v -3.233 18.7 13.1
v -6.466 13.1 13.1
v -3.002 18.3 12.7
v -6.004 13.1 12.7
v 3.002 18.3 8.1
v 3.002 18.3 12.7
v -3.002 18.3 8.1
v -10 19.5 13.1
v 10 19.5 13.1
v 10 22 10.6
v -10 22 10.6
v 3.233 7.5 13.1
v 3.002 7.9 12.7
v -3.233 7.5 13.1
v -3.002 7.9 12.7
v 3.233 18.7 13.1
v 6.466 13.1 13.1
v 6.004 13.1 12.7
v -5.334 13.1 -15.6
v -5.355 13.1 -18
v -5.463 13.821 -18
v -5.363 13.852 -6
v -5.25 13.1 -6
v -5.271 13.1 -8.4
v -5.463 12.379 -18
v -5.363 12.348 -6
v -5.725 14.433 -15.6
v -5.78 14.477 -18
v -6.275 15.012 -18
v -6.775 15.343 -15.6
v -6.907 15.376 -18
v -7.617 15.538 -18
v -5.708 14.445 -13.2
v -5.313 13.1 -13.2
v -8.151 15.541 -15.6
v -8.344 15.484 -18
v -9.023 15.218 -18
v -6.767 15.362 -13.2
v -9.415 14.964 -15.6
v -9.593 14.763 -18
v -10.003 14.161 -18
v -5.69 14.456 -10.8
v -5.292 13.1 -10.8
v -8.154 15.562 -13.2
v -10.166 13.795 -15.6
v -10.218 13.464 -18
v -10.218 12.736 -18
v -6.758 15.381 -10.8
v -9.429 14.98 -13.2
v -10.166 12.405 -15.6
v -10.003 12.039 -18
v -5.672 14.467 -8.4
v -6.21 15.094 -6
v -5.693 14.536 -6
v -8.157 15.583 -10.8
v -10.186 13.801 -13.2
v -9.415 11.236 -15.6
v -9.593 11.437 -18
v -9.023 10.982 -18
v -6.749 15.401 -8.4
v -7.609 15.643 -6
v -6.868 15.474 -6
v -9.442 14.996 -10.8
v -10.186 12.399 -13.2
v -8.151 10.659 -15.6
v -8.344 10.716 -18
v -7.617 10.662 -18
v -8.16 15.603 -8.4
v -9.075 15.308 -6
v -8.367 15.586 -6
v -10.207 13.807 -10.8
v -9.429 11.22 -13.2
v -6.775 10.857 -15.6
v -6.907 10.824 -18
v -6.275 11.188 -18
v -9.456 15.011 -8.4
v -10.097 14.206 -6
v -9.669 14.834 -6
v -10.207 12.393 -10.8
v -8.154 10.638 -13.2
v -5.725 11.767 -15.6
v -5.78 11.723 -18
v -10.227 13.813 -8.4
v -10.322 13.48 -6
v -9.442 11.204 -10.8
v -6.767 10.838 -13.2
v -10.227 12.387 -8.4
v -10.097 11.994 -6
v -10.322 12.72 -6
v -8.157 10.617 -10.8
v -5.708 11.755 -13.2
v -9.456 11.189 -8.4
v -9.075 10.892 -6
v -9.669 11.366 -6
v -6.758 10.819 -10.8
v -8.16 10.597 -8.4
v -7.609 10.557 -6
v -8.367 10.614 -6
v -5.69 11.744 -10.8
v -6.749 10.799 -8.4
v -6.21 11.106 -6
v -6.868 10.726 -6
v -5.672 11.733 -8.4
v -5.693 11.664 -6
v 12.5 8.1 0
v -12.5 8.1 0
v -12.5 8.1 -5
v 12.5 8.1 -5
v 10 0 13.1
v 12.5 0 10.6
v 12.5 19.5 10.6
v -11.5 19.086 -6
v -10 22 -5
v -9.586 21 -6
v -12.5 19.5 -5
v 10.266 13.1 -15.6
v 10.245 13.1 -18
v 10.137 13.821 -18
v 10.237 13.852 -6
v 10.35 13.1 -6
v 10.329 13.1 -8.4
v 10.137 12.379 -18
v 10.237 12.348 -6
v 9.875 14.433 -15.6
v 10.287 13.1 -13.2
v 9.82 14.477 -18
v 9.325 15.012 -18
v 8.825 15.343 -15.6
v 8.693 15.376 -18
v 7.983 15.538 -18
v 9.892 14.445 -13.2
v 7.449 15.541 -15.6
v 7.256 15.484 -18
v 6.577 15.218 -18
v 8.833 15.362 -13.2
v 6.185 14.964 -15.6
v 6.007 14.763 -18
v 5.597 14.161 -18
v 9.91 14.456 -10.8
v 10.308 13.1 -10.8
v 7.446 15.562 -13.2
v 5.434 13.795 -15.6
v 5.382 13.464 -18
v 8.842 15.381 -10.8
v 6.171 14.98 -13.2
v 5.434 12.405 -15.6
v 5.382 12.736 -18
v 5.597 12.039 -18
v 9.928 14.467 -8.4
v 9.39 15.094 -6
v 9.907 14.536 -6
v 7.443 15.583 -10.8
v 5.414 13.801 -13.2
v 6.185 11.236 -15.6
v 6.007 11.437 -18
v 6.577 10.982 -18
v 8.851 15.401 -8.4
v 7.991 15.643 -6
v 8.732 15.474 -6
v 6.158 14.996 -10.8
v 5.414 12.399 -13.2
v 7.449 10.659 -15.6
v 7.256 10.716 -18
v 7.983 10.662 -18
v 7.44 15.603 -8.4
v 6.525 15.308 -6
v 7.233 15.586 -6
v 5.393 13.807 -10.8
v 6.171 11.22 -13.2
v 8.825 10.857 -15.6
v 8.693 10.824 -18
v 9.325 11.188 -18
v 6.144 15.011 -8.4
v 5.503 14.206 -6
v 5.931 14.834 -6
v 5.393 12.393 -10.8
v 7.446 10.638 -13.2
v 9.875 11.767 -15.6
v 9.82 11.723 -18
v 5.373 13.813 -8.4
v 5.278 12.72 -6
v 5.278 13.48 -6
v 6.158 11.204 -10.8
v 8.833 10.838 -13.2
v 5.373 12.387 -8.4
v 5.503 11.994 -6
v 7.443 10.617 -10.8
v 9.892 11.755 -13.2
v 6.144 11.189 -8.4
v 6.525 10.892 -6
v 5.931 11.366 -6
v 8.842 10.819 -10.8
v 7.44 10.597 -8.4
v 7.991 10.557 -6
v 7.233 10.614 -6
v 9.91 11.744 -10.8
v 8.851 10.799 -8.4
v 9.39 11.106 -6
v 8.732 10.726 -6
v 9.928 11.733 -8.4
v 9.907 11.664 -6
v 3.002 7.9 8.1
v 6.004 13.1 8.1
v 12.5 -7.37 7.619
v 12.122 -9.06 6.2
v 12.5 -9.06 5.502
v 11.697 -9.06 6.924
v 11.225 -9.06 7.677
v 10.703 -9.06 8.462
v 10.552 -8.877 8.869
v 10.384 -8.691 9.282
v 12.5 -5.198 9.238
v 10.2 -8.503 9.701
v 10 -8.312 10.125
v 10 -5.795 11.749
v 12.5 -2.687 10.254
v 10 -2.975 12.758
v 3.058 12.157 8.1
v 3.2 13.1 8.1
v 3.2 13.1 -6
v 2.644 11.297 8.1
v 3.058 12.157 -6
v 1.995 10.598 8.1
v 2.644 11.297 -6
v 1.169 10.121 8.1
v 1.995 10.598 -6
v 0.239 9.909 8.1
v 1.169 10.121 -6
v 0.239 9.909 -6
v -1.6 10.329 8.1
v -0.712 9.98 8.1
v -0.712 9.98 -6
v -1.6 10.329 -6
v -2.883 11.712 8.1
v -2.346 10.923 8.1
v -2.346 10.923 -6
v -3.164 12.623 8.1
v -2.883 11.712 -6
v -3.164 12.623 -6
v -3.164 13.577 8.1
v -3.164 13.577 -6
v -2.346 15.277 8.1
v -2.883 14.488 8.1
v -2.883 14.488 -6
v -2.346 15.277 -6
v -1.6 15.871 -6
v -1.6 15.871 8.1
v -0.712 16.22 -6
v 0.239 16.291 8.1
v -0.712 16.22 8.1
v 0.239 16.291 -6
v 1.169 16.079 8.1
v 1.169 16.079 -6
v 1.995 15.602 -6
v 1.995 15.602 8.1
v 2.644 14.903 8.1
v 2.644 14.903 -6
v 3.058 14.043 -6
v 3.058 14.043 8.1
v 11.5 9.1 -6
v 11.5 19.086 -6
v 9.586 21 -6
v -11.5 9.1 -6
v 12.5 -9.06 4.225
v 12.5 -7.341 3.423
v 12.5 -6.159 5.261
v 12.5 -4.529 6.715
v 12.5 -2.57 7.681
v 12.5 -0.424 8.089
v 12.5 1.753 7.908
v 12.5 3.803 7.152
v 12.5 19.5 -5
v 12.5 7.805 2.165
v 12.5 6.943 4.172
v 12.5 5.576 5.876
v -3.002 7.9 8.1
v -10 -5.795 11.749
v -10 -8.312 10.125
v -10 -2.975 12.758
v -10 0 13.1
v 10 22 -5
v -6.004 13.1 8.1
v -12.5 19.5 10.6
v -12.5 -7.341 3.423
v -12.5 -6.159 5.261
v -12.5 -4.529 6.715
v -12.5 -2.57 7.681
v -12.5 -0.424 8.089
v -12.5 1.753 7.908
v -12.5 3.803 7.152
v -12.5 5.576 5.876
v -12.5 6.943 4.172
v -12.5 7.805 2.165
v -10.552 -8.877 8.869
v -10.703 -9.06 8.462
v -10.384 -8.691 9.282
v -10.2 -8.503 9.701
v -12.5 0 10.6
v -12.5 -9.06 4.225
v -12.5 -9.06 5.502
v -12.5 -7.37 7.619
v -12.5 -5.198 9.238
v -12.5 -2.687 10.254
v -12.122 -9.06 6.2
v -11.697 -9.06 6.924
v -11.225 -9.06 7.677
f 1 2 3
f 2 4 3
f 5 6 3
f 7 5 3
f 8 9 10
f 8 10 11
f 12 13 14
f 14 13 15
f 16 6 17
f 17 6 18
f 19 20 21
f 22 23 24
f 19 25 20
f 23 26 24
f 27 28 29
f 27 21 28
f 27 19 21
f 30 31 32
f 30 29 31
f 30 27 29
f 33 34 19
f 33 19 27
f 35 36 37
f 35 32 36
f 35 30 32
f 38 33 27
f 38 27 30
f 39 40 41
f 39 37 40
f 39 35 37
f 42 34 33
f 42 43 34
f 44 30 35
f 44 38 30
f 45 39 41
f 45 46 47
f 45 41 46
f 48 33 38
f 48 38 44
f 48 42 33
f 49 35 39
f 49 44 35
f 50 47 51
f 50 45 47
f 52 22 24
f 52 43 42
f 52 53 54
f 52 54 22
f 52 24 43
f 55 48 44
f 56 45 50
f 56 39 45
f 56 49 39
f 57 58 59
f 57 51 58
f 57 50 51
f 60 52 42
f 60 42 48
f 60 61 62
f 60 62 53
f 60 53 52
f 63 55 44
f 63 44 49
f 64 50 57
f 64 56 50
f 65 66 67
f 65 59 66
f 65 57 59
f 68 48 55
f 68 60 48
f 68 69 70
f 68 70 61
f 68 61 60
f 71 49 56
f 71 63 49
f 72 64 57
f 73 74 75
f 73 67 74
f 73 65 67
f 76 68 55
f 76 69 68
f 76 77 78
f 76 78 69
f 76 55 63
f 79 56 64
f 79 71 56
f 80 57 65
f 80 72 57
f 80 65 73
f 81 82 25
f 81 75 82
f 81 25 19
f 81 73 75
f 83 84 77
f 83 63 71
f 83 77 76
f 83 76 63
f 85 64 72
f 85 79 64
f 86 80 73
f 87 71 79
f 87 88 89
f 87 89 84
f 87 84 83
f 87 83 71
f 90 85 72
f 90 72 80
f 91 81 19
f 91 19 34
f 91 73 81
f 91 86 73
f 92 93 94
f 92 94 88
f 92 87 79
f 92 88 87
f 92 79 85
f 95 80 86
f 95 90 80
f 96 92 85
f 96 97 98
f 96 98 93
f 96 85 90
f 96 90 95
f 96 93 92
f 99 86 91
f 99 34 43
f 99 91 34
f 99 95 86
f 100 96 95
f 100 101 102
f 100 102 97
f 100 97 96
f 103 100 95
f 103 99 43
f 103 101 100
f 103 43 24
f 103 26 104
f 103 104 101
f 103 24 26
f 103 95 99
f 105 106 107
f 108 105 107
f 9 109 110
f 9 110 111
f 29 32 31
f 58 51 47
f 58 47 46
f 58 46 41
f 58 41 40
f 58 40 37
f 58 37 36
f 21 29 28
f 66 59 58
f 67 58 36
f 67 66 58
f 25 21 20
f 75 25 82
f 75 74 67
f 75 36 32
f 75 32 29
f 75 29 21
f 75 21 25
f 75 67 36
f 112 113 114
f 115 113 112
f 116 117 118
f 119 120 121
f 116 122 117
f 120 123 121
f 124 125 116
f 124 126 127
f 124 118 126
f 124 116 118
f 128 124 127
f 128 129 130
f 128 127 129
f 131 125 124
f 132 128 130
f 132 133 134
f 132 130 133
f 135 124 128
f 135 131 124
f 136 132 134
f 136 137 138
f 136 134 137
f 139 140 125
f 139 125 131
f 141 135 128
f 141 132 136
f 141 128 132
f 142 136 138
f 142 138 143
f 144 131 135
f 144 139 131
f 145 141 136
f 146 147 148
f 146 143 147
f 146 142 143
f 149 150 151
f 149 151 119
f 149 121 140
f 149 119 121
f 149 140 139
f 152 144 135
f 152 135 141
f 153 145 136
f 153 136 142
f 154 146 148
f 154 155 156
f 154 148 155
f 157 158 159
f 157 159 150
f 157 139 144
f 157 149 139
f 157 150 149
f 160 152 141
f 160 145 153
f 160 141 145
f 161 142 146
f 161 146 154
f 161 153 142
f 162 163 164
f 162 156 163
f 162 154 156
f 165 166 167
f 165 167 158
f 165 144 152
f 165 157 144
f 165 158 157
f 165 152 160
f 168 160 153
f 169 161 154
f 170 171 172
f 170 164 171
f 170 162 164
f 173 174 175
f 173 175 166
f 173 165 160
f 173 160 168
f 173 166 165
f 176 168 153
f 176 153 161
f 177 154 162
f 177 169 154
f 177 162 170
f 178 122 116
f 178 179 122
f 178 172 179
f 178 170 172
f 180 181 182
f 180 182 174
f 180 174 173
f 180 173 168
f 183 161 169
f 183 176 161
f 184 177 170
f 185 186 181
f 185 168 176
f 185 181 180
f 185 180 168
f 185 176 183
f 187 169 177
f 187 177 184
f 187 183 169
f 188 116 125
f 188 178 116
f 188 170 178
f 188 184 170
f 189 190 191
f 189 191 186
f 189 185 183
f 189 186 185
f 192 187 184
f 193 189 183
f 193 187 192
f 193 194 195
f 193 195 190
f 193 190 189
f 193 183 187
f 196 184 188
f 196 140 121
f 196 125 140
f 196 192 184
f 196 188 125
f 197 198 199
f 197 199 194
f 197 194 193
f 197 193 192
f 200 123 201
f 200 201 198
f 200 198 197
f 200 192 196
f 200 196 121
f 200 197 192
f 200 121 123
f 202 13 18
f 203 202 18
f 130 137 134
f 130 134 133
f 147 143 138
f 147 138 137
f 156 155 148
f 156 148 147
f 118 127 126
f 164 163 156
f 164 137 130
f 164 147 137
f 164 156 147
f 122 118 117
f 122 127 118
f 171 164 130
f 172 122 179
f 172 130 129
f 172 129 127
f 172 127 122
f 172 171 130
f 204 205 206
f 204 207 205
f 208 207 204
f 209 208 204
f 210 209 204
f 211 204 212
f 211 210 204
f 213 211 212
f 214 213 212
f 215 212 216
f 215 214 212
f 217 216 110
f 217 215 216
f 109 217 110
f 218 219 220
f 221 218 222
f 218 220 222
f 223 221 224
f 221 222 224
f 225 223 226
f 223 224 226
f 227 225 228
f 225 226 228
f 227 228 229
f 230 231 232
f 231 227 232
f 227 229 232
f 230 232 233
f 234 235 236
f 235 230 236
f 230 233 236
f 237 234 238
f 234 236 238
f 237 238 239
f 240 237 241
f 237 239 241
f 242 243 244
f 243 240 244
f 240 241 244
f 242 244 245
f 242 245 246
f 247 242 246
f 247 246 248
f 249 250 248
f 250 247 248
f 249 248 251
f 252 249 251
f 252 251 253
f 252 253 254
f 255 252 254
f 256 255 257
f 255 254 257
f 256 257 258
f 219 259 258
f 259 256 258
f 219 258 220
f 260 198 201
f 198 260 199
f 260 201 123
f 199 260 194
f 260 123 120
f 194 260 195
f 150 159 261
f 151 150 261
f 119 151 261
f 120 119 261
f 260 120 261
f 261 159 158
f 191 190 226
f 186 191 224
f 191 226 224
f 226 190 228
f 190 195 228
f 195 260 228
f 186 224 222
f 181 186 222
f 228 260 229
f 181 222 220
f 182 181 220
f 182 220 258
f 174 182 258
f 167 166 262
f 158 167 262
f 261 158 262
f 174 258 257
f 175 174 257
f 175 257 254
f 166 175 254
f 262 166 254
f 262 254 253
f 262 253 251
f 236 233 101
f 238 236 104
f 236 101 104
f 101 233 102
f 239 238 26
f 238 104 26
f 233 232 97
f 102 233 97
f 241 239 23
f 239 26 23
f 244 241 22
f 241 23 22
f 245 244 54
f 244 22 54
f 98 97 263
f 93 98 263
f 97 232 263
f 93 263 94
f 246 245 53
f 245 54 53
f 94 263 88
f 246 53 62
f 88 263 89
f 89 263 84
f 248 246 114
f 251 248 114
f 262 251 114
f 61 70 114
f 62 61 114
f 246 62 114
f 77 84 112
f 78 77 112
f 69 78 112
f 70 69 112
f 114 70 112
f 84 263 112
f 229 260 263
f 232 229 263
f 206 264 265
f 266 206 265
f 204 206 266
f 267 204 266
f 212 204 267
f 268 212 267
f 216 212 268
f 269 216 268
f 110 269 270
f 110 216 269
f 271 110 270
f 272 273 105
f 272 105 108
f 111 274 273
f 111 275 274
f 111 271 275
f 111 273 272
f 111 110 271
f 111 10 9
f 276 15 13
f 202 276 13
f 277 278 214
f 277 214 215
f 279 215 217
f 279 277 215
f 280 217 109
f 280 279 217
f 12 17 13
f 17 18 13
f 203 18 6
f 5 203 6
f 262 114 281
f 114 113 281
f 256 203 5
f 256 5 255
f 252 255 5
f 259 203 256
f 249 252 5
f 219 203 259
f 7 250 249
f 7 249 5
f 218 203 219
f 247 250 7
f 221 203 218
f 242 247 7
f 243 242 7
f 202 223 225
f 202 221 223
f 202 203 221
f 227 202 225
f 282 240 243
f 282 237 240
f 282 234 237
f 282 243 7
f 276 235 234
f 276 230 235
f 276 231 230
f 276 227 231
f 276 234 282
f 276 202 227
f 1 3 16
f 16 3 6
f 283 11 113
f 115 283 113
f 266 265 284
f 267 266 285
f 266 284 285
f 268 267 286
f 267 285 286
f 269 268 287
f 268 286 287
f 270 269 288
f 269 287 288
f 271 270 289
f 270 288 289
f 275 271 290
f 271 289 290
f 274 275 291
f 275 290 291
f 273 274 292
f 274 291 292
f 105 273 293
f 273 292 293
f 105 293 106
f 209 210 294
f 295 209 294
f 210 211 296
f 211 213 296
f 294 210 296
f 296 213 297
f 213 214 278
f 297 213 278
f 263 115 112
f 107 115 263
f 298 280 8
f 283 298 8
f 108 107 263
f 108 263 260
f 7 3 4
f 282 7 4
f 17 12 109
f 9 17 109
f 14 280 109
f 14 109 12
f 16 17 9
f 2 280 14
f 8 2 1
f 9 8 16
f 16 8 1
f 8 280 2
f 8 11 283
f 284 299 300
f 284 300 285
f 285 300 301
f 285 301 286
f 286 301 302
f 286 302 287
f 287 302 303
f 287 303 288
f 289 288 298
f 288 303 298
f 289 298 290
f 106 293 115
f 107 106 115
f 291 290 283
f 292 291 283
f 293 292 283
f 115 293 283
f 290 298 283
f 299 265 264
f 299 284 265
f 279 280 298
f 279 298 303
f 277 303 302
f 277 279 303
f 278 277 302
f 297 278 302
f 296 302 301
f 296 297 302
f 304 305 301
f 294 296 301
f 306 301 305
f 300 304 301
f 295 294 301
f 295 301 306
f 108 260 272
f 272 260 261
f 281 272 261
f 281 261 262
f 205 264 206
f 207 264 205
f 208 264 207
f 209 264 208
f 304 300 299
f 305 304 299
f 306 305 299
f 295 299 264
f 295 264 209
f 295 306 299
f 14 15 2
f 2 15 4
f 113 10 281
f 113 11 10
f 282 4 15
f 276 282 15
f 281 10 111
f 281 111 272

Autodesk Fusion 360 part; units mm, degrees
sketch "Sketch1" plane through (0, 0, 0) normal (1, 0, 0) x (0, 1, 0)
  line L0 (7.7961, -6) -> (22, -6)
  line L1 (8.1, 0) -> (8.1, -8)
  circle A0 centre (0, 0) radius 11.1
  line L2 (0, 11.1) -> (22, 11.1)
  line L3 (22, 11.1) -> (22, -8)
  circle A1 centre (0, 0) radius 8.1
  line L4 (0, 0) -> (-8.1139, 8.1139)
  line L5 (0, 0) -> (-10.06, 4.6911)
  circle A2 centre (0, 0) radius 6.5
  circle A3 centre (0, 0) radius 13.1
  line L6 (-10.06, 4.6911) -> (-10.06, 9.7741)
  line L7 (0, 13.1) -> (22, 13.1)
  line L8 (22, 13.1) -> (22, 11.1)
  line L9 (-9.06, 4.2248) -> (-9.06, 9.7741)
  dimension "d179" = 3
  dimension "d181" = 16.2
  dimension "d182" = 20
  dimension "d6" = 5
  dimension "d33" = 22
extrude "Extrude1" add sketch "Sketch1" along normal mid plane 25 contours L0 L1 A0 A1 L4 | L0 A0 L2 A3 | L0 L2 L3 A3 | A0 A1 L4 L5 L9 | A0 L2 A3 L9 | L2 A3 L7 L8
sketch "Sketch2" plane through (0, 0, -6) normal (0, 0, -1) x (1, 0, 0)
  line L0 (-12.5, -22) -> (12.5, -22)
  line L1 (12.5, -22) -> (12.5, -8.1)
  line L2 (12.5, -8.1) -> (-12.5, -8.1)
  line L3 (-12.5, -8.1) -> (-12.5, -22)
  circle A0 centre (-11.3, 12.8) radius 2.55
  circle A1 centre (-11.3, 12.8) radius 1
  circle A2 centre (4.3, 12.8) radius 2.55
  circle A3 centre (4.3, 12.8) radius 1
  circle A4 centre (0, -13.1) radius 3.2
  circle A5 centre (-7.8, -13.1) radius 2.55
  circle A6 centre (-7.8, -13.1) radius 2.2
  circle A7 centre (7.8, -13.1) radius 2.55
  circle A8 centre (7.8, -13.1) radius 2.2
  dimension "d233" = 2
  dimension "d234" = 2
  dimension "d240" = 15.6
  dimension "d242" = 5.1
  dimension "d243" = 5.1
  dimension "d162" = 6.4
  dimension "d223" = 5.1
  dimension "d224" = 5.1
  dimension "d225" = 4.4
  dimension "d226" = 4.4
  dimension "d227" = 15.6
  dimension "d20" = 7.8
  dimension "d32" = 5
extrude "Extrude2" add sketch "Sketch2" along normal blind 12 contours A5 | A6 | A7 | A8
draft "Draft1" angle 0.5 neutral plane through (0, 11.6452, -6) pull (0, 0, -1) 2 faces at (-5.2532, 13.2271, -14) (10.3468, 13.2271, -14)
sketch "Sketch3" plane through (0, 0, -6) normal (0, 0, -1) x (1, 0, 0)
extrude "Extrude3" cut sketch "Sketch2" against normal blind 20 contours A4
sketch "Sketch4" plane through (0, 0, 13.1) normal (0, 0, 1) x (-1, 0, 0)
  circle A0 centre (0, -13.1) radius 3.2
  line L0 (12.5, 0) -> (-12.5, 0)
  line L1 (-12.5, 0) -> (-12.5, -22)
  line L2 (-12.5, -22) -> (12.5, -22)
  line L3 (12.5, -22) -> (12.5, 0)
  line L4 (3.0022, -18.3) -> (6.0044, -13.1)
  line L5 (6.0044, -13.1) -> (3.0022, -7.9)
  line L6 (3.0022, -7.9) -> (-3.0022, -7.9)
  line L7 (-3.0022, -7.9) -> (-6.0044, -13.1)
  line L8 (-6.0044, -13.1) -> (-3.0022, -18.3)
  line L9 (-3.0022, -18.3) -> (3.0022, -18.3)
  point P0 (0, -13.1)
  dimension "d27" = 5.2
extrude "Extrude4" cut sketch "Sketch4" against normal blind 5 contours L4 L5 L6 L7 L8 L9
chamfer "Chamfer2" distance 2.5 angle 45 7 edges at (-12.5, 22, 3.55) (12.5, 22, 3.55) (0, 22, 13.1) (12.5, 11, 13.1) (12.5, -4.8816, 12.1565) (-12.5, 11, 13.1) (-12.5, -4.8816, 12.1565)
chamfer "Chamfer1" distance 1 angle 45 7 edges at (0, -9.06, 9.4618) (12.5, 13.8, -6) (0, 8.1, -6) (0, 22, -6) (-12.5, 13.8, -6) (11.25, 20.75, -6) (-11.25, 20.75, -6)
chamfer "Chamfer3" distance 0.4 angle 45 6 edges at (4.5033, 15.7, 13.1) (0, 18.3, 13.1) (-4.5033, 15.7, 13.1) (-4.5033, 10.5, 13.1) (0, 7.9, 13.1) (4.5033, 10.5, 13.1)
equation "d20 = d227 / 2"
